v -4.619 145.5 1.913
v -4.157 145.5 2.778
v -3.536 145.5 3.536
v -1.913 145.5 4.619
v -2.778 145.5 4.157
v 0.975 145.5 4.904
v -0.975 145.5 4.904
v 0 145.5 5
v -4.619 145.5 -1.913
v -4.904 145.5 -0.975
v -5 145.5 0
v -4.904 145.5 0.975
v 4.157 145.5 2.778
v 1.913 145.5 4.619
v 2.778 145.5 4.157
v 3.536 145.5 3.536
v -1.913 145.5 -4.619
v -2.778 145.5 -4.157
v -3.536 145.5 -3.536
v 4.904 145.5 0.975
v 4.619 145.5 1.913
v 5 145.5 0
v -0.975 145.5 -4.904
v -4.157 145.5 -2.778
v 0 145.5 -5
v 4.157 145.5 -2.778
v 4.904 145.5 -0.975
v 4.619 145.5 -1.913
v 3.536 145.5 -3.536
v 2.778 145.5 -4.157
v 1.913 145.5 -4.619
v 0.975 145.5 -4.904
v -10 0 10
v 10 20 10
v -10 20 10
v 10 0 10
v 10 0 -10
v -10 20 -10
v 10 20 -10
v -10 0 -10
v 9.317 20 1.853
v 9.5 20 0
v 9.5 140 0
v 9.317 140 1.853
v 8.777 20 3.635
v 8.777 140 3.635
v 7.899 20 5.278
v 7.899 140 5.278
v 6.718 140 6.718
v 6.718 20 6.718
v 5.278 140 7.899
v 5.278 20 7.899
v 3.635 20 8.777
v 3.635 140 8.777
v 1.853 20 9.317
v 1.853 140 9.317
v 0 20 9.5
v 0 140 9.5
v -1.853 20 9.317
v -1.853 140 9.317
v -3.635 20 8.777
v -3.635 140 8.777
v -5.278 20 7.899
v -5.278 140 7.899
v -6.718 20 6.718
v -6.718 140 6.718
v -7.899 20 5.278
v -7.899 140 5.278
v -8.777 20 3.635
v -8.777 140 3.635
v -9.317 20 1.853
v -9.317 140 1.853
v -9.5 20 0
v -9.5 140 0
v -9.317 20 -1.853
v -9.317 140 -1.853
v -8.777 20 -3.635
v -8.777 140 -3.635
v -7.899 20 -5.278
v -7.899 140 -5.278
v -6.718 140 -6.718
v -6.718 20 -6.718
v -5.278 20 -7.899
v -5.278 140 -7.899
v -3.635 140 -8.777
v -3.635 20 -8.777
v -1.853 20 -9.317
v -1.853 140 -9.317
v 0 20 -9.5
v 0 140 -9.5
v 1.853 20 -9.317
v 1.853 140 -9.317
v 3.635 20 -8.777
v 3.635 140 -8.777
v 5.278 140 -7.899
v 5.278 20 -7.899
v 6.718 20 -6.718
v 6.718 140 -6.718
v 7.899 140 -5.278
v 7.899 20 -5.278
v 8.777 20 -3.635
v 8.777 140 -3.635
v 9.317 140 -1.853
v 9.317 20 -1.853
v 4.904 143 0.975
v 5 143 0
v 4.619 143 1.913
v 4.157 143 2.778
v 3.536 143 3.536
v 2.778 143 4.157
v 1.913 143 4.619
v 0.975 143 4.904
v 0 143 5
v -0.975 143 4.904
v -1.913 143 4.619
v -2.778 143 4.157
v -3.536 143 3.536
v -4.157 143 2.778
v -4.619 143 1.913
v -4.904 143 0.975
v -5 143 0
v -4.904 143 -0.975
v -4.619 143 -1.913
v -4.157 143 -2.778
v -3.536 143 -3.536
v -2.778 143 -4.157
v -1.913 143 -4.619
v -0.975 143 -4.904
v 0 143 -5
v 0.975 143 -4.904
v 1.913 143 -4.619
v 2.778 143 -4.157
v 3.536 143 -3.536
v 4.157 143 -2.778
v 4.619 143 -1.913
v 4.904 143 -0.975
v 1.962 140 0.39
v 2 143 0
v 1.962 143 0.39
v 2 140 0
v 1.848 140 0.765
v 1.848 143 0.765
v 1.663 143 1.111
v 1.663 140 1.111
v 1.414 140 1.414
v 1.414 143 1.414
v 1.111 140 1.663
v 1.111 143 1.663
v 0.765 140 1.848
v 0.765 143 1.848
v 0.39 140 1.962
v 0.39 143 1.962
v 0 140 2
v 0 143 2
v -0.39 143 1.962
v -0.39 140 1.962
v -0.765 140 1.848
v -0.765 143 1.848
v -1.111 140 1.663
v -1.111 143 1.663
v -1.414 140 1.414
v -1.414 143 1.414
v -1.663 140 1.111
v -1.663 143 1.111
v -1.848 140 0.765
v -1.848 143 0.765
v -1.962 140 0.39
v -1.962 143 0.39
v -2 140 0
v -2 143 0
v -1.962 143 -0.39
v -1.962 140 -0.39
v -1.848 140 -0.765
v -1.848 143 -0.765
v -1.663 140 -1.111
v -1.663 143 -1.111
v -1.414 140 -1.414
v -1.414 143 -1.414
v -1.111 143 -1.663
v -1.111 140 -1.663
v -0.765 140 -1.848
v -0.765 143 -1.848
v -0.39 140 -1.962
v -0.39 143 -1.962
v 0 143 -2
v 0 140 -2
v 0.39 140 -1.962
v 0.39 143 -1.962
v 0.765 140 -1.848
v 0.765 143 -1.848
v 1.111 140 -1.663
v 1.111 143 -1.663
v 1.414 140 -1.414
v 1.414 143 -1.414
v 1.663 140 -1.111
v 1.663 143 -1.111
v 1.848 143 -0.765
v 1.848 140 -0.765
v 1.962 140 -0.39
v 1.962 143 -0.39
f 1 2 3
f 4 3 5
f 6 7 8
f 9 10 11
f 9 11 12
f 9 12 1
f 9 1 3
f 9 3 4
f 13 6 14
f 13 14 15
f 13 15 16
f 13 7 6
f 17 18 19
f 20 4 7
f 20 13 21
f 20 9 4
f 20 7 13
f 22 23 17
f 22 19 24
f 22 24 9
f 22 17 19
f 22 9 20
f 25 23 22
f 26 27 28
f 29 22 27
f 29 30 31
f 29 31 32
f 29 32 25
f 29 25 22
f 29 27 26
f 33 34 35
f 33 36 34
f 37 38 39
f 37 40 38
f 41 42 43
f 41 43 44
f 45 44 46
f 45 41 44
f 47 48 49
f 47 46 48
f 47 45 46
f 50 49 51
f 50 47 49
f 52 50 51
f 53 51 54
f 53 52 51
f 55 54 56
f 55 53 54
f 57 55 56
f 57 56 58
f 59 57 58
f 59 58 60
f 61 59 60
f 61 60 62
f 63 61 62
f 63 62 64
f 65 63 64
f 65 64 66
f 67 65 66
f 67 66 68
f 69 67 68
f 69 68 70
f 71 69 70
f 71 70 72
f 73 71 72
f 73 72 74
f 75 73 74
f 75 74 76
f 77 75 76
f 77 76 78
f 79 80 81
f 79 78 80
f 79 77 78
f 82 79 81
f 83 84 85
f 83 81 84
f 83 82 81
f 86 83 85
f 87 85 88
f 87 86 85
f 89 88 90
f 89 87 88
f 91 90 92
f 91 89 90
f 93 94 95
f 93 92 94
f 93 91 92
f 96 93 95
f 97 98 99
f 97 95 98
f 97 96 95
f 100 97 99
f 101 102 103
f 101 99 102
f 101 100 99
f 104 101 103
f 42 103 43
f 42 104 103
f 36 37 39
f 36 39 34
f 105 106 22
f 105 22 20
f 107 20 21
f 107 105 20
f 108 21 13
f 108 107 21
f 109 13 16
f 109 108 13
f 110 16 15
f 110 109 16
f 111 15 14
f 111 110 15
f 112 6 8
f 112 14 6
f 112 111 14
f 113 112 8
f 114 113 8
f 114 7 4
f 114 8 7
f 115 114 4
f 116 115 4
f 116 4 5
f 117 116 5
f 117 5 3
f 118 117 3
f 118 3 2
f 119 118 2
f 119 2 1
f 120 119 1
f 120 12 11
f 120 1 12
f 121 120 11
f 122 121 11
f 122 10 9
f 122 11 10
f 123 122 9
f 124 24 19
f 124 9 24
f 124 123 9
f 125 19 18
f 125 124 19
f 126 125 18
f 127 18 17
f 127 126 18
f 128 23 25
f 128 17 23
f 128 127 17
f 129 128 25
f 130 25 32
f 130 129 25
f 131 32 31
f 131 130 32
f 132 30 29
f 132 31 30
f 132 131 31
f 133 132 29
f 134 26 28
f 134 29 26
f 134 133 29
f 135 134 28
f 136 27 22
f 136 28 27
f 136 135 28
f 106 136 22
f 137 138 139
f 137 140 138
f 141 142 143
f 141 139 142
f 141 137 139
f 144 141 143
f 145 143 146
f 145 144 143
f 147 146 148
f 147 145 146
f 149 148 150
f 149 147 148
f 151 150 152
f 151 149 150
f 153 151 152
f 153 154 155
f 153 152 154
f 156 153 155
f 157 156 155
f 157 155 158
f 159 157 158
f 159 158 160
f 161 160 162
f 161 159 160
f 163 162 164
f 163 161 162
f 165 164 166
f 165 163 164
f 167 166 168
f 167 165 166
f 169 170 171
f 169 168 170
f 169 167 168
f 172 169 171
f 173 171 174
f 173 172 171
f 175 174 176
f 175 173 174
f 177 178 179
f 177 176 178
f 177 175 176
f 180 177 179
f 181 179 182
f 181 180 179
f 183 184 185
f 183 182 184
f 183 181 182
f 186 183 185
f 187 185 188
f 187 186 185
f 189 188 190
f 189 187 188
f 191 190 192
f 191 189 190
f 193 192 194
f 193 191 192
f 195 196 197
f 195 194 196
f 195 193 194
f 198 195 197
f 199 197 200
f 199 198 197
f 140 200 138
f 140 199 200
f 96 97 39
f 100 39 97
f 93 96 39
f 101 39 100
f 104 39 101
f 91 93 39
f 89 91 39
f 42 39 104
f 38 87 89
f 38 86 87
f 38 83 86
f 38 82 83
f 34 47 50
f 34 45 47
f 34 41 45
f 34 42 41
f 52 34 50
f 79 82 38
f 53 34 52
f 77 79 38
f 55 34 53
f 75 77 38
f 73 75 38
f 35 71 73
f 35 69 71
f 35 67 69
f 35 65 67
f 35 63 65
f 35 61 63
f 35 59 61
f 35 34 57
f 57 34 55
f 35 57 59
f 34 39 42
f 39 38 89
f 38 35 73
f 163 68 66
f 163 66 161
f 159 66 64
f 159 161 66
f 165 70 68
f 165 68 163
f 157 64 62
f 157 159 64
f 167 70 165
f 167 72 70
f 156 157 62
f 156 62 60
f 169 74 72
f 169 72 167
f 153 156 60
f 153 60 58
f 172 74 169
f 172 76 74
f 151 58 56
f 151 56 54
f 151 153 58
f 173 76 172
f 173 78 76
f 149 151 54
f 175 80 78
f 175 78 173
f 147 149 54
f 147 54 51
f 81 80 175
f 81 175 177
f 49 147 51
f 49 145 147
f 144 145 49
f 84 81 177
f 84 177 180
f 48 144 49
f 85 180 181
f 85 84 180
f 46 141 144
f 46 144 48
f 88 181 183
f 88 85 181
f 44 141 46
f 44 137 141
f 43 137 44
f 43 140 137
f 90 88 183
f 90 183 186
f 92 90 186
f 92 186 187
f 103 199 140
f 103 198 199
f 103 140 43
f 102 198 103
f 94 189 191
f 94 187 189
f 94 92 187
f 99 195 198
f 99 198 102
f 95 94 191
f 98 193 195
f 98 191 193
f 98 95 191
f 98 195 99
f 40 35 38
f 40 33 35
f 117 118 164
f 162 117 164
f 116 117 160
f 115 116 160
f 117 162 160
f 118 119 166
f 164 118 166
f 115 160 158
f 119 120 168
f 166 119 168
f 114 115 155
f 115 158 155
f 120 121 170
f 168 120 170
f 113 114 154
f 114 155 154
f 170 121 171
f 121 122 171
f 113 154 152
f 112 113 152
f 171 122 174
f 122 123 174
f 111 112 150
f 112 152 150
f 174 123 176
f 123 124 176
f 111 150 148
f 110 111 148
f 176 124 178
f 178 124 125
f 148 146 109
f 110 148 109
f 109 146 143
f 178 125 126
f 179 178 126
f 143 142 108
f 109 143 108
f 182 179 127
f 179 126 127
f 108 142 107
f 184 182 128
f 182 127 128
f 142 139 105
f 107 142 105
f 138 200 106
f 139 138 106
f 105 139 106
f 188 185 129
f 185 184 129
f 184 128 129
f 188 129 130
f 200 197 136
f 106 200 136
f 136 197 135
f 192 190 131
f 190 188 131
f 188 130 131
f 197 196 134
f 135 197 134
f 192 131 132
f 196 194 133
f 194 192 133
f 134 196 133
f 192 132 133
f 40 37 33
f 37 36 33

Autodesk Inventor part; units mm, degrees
ref_plane "YZ Plane" through (0, 0, 0) normal (1, 0, 0) x (0, 1, 0)
ref_plane "XZ Plane" through (0, 0, 0) normal (0, 1, 0) x (-1, 0, 0)
ref_plane "XY Plane" through (0, 0, 0) normal (0, 0, 1) x (1, 0, 0)
sketch "Sketch1" plane through (0, 0, 0) normal (0, 1, 0) x (-1, 0, 0)
  line L0 (-10, 10) -> (10, 10)
  line L1 (10, 10) -> (10, -10)
  line L2 (10, -10) -> (-10, -10)
  line L3 (-10, -10) -> (-10, 10)
  line L4 (-10, 10) -> (10, -10) construction
  line L5 (10, 10) -> (-10, -10) construction
  point P0 (0, 0)
  dimension "d0" = 20
  dimension "d1" = 20
extrude "Extrusion1" add sketch "Sketch1" along normal blind 20
sketch "Sketch2" plane through (0, 20, 0) normal (0, 1, 0) x (1, 0, 0)
  circle A0 centre (0, 0) radius 9.5
  dimension "d4" = 19
extrude "Extrusion2" add sketch "Sketch2" along normal blind 120
sketch "Sketch3" plane through (0, 140, 0) normal (0, 1, 0) x (1, 0, 0)
  circle A0 centre (0, 0) radius 2
  dimension "d7" = 4
extrude "Extrusion3" add sketch "Sketch3" along normal blind 3
sketch "Sketch4" plane through (0, 143, 0) normal (0, 1, 0) x (1, 0, 0)
  circle A0 centre (0, 0) radius 5
  dimension "d10" = 10
extrude "Extrusion4" add sketch "Sketch4" along normal blind 2.5
thread "Thread1" size "TR16x4" class "7e" standard "ISO Metric Trapezoidal Threads" full length
properties part number "Trapezspindle" material "Steel"
